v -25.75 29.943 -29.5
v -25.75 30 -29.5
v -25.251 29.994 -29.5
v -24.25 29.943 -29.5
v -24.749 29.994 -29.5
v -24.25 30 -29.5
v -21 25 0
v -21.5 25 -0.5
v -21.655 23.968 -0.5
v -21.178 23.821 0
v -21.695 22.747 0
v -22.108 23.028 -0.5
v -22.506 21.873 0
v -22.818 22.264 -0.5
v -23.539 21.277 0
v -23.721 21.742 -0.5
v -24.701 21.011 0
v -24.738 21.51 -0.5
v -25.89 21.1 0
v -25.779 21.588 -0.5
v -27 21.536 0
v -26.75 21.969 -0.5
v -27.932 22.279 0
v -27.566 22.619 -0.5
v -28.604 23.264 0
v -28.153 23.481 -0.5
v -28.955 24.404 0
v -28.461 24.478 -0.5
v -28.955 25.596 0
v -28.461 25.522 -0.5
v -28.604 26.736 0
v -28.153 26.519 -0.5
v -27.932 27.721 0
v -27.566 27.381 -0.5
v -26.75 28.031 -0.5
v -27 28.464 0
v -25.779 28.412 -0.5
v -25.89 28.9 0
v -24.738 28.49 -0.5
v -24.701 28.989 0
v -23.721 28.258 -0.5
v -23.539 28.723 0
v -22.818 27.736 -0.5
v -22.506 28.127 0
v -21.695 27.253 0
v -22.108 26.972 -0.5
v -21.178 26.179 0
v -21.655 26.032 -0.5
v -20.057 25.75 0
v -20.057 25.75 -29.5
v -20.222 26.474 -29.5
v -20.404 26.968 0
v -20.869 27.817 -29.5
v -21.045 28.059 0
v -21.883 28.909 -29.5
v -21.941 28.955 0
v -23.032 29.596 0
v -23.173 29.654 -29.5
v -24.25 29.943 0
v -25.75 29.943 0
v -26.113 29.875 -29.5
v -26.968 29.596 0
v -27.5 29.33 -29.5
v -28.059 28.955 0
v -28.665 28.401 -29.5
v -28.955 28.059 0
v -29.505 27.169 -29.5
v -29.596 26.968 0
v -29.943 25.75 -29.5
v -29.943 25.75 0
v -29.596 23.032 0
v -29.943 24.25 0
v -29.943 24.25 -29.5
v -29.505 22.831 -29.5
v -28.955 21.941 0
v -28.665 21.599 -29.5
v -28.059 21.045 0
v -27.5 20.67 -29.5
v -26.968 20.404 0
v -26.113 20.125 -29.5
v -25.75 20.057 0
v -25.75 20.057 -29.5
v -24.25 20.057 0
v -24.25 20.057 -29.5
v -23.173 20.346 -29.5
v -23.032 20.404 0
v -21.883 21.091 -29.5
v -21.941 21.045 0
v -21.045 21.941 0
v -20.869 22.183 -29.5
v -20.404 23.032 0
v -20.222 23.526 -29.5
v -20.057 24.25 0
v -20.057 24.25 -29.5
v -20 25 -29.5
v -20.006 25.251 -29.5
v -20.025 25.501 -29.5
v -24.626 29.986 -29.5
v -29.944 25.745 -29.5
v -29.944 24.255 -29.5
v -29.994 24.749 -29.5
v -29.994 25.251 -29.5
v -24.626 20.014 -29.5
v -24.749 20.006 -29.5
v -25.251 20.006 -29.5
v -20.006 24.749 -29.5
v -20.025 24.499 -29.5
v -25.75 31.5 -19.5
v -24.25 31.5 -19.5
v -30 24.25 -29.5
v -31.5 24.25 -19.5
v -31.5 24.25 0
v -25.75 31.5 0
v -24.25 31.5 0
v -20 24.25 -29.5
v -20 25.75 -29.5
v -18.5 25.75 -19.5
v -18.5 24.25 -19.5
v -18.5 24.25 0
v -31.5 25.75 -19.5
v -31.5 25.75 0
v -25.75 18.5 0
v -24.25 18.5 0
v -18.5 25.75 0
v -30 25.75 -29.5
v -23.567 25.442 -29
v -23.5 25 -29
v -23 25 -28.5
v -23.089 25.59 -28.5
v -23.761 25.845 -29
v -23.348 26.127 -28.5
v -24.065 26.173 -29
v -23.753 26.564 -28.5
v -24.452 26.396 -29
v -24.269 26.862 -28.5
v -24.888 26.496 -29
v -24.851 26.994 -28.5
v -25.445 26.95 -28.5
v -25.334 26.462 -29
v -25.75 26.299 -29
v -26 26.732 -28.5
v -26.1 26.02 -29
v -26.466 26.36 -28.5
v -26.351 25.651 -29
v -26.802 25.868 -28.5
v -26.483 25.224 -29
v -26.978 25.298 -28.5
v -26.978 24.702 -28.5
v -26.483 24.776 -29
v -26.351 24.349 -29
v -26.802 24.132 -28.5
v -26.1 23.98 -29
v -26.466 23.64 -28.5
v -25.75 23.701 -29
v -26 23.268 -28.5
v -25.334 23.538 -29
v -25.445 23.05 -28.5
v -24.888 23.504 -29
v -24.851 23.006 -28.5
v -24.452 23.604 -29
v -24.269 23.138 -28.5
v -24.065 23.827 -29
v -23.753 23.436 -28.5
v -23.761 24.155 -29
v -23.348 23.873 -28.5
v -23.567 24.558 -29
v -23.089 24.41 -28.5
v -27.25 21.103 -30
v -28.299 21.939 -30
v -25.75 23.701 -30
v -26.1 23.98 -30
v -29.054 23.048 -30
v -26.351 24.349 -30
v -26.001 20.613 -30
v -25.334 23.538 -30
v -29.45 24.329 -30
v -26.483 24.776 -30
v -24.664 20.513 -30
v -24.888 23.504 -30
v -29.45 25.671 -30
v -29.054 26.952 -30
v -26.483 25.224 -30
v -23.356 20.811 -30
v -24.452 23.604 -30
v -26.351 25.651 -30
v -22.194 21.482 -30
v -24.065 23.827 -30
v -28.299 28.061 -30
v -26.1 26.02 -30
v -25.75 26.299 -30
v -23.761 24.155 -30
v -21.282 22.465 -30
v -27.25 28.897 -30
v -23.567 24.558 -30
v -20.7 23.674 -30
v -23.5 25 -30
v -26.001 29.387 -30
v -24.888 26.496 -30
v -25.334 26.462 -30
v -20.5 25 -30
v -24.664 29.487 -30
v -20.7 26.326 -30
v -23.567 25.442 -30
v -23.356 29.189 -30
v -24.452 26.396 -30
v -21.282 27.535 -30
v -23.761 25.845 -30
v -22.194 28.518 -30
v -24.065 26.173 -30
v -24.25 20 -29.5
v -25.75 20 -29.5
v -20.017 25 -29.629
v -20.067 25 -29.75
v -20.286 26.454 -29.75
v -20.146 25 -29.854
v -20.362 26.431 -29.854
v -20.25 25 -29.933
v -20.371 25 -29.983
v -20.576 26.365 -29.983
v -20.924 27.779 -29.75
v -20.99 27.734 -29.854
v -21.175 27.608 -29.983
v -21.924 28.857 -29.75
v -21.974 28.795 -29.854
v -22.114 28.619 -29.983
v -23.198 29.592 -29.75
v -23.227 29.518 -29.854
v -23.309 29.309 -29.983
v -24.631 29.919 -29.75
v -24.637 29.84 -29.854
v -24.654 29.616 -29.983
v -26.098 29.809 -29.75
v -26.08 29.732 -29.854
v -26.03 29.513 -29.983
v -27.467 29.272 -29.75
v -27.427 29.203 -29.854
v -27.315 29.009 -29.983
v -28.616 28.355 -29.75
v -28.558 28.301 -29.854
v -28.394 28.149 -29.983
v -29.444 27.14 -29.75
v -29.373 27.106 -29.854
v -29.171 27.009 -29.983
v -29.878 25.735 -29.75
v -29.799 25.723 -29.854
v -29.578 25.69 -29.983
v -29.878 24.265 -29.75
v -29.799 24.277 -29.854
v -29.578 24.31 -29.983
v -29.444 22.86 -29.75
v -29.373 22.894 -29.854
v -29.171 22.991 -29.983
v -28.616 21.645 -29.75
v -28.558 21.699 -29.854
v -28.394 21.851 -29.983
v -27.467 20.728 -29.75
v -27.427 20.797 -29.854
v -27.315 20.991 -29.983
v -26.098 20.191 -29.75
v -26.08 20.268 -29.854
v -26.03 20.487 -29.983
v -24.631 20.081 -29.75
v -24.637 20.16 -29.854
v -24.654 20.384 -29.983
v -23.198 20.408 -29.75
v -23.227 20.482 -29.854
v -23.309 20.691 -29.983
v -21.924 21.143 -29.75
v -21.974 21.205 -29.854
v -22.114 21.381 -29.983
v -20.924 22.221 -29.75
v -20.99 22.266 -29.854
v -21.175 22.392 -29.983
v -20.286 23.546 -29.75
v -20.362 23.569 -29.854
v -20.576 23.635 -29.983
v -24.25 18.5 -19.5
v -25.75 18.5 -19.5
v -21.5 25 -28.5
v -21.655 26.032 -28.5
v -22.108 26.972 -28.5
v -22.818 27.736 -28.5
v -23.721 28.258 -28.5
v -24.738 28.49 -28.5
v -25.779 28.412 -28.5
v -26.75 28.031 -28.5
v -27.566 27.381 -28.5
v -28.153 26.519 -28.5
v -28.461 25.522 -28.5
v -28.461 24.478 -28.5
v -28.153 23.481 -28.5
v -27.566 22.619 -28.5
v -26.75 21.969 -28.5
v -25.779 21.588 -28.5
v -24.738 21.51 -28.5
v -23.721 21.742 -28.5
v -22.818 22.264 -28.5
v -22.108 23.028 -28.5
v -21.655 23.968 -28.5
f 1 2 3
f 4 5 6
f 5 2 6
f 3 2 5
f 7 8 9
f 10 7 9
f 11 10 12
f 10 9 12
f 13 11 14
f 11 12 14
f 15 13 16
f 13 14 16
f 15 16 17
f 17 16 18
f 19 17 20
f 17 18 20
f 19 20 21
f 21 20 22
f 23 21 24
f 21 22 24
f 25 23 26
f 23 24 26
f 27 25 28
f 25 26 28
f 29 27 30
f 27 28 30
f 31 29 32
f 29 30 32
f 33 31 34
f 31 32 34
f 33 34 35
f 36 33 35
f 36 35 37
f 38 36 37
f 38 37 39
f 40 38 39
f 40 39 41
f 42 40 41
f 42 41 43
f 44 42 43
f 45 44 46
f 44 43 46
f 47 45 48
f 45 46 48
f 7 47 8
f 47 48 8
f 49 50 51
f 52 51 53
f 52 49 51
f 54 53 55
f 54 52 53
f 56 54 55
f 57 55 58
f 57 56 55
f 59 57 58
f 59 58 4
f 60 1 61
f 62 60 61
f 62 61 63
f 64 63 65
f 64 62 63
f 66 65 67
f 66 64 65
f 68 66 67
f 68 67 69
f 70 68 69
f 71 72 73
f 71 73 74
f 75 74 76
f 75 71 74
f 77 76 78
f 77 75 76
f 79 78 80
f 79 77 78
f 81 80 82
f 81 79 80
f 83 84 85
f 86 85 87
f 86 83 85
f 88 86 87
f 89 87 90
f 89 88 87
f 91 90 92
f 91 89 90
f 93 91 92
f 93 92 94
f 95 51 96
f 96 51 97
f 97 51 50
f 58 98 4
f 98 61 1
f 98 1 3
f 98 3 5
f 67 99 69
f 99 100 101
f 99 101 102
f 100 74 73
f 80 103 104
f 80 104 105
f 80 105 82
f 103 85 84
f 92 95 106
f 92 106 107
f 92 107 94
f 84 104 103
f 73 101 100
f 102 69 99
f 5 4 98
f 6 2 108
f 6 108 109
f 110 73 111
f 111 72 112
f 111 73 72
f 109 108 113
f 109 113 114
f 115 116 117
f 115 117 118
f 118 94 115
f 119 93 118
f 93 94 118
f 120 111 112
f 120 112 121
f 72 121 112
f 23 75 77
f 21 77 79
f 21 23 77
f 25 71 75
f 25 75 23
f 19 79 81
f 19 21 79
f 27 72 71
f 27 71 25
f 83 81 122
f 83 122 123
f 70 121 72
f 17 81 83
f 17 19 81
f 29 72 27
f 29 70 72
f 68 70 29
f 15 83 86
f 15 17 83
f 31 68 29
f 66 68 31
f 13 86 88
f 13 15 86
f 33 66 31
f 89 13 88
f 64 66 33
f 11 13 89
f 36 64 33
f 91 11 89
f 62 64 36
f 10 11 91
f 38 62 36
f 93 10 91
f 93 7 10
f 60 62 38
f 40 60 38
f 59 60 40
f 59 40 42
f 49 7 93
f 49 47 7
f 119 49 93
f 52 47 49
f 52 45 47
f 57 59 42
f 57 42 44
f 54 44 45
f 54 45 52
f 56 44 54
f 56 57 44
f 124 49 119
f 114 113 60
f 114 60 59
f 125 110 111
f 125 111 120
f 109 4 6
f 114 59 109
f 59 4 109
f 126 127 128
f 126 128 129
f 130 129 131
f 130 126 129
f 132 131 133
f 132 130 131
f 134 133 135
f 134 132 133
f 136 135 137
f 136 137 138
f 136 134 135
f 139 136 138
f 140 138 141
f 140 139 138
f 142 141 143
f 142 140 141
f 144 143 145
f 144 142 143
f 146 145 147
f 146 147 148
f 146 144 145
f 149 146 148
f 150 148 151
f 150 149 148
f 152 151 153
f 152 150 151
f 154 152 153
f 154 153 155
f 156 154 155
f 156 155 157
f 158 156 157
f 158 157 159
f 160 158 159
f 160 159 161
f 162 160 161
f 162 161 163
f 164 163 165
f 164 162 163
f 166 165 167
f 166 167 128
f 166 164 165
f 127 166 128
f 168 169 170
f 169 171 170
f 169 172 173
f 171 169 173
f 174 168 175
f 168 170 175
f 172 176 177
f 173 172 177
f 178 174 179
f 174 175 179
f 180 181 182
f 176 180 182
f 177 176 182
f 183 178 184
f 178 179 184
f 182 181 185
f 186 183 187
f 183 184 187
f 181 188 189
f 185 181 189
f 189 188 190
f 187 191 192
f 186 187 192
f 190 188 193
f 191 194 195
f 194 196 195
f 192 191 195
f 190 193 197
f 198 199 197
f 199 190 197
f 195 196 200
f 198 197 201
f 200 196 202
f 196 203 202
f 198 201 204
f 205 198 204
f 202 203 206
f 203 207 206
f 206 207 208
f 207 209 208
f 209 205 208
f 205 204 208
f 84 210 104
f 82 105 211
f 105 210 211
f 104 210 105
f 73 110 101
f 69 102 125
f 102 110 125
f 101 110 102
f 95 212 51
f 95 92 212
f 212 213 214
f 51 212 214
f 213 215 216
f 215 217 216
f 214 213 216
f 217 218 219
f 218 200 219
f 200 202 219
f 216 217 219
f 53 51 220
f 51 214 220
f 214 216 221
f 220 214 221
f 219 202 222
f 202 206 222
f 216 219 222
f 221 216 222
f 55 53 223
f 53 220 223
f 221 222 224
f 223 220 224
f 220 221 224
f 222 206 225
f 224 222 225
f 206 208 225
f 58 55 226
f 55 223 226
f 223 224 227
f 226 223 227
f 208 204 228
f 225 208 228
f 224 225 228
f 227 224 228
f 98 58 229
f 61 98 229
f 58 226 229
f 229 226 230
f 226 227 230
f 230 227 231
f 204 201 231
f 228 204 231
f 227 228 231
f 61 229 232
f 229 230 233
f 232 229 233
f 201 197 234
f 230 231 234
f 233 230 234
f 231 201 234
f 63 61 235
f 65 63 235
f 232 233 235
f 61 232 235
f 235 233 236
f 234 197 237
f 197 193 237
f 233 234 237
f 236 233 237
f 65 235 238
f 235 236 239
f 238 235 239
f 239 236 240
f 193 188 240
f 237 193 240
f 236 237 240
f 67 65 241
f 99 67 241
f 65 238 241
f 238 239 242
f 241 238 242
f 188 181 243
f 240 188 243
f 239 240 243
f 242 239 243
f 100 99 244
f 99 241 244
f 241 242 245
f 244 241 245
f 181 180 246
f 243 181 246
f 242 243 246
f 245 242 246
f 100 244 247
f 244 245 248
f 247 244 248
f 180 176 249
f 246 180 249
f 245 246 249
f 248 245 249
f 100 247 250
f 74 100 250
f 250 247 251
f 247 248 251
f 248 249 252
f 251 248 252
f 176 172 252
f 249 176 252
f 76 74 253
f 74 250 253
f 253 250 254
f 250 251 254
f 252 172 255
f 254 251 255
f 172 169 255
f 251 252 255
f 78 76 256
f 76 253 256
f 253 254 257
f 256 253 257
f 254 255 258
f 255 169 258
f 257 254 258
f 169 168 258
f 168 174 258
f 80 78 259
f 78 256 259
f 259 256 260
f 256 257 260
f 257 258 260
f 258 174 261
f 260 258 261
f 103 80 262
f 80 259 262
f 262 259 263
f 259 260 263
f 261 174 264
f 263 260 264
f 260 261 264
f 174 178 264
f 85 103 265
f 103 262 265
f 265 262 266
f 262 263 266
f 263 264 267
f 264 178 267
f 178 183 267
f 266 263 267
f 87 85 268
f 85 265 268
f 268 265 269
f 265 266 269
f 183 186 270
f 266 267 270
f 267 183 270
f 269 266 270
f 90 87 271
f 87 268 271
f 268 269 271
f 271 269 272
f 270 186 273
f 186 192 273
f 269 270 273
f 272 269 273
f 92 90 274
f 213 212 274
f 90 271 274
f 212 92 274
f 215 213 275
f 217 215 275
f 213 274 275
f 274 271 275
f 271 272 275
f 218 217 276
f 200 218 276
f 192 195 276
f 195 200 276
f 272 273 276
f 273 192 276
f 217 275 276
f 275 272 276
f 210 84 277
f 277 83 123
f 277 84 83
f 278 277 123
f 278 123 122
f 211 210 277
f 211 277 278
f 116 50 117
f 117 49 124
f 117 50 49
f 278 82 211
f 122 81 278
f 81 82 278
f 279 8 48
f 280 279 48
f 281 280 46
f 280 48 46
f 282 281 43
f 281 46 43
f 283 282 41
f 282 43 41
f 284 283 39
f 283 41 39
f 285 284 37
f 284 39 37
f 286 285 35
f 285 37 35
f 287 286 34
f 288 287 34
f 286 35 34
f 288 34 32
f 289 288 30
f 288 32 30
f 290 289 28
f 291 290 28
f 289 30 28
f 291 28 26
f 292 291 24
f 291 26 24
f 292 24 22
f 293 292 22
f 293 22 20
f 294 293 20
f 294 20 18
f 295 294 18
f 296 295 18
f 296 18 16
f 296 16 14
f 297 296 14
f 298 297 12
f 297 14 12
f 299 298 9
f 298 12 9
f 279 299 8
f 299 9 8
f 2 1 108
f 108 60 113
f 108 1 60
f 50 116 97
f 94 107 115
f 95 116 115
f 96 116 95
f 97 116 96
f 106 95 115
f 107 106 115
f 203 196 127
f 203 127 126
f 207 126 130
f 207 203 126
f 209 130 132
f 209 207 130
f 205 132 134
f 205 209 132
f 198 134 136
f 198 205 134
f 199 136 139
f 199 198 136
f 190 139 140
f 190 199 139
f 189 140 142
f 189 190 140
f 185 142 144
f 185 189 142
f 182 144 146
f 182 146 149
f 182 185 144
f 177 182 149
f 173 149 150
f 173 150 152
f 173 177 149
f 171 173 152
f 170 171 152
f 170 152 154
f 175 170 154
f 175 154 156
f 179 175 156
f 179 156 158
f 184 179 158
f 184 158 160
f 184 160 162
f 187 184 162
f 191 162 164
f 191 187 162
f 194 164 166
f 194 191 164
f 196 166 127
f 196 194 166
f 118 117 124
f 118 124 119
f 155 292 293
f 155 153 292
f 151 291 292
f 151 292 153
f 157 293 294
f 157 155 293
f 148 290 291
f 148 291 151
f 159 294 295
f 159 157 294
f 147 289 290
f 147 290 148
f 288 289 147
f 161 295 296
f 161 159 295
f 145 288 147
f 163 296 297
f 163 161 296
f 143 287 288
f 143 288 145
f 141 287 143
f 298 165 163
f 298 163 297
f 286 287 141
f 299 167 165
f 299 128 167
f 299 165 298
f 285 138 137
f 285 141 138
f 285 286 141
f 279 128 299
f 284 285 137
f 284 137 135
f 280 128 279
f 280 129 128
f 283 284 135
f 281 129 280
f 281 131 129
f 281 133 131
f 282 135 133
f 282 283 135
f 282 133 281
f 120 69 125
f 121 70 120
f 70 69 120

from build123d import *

# Parameters (mm, degrees)
F1_R        = 5
F1_R_2      = 3.5
F2_DEPTH    = 30
F4_W        = 1.5
F4_H        = 2.639524132
F5_DEPTH    = 29.5
F6_COUNT    = 4
F8_R        = 3.5
F8_R_2      = 1.5
F9_DEPTH    = 1.5
F10_SIZE2   = 1.49999
F10_SIZE    = 9.99999
F10_2_SIZE2 = 1.49999
F10_2_SIZE  = 9.99999
F10_3_SIZE2 = 1.49999
F10_3_SIZE  = 9.99999
F10_4_SIZE2 = 1.49999
F10_4_SIZE  = 9.99999
F11_SIZE    = 0.5
F12_R       = 0.49999


# Not quite as in the source:
# - a fillet or chamfer is up to 0.001 mm smaller than in the source, because OpenCascade refuses the exact size


with BuildPart() as f2:
    # F1 (on offset) → F2 (new body)
    with BuildSketch(Plane.XY):
        with Locations((-25, 25)):
            Circle(F1_R)
        with Locations((-25, 25)):
            Circle(F1_R_2, mode=Mode.SUBTRACT)
    extrude(amount=-F2_DEPTH)

    # F4 (on offset) → F5 (join)
    with BuildSketch(Plane.XY):
        with Locations((-25, 30.180237934)):
            Rectangle(F4_W, F4_H)
    extrude(amount=-F5_DEPTH)

    # F6: F2 ×4 about axis
    f6_axis = Axis((-25, 25, 0), (0, 0, 1))


with BuildPart() as f2_1:
    add(f2.part)
    for i in range(1, F6_COUNT):
        add(f2.part.rotate(f6_axis, i * 360 / F6_COUNT))

    # F8 (on offset) → F9 (join)
    with BuildSketch(Plane.XY.offset(-30)):
        with Locations((-25, 25)):
            Circle(F8_R)
        with Locations((-25, 25)):
            Circle(F8_R_2, mode=Mode.SUBTRACT)
    extrude(amount=F9_DEPTH)

    # F10 (size 10 and 1.5 in the source; OpenCascade refuses exactly that, so slightly less here)
    f10_edges = [f2_1.edges().sort_by_distance(p)[0] for p in [
        (-25, 18.5, -29.5),
    ]]
    f10_side = f2_1.faces().sort_by_distance((-25, 18.5, -14.75))[0]
    chamfer(f10_edges, length=F10_SIZE, length2=F10_SIZE2, reference=f10_side)

    # F10#2 (size 10 and 1.5 in the source; OpenCascade refuses exactly that, so slightly less here)
    f10_2_edges = [f2_1.edges().sort_by_distance(p)[0] for p in [
        (-18.5, 25, -29.5),
    ]]
    f10_2_side = f2_1.faces().sort_by_distance((-18.5, 25, -14.75))[0]
    chamfer(f10_2_edges, length=F10_2_SIZE, length2=F10_2_SIZE2, reference=f10_2_side)

    # F10#3 (size 10 and 1.5 in the source; OpenCascade refuses exactly that, so slightly less here)
    f10_3_edges = [f2_1.edges().sort_by_distance(p)[0] for p in [
        (-25, 31.5, -29.5),
    ]]
    f10_3_side = f2_1.faces().sort_by_distance((-25, 31.5, -14.75))[0]
    chamfer(f10_3_edges, length=F10_3_SIZE, length2=F10_3_SIZE2, reference=f10_3_side)

    # F10#4 (size 10 and 1.5 in the source; OpenCascade refuses exactly that, so slightly less here)
    f10_4_edges = [f2_1.edges().sort_by_distance(p)[0] for p in [
        (-31.5, 25, -29.5),
    ]]
    f10_4_side = f2_1.faces().sort_by_distance((-31.5, 25, -14.75))[0]
    chamfer(f10_4_edges, length=F10_4_SIZE, length2=F10_4_SIZE2, reference=f10_4_side)

    # F11
    f11_edges = [f2_1.edges().sort_by_distance(p)[0] for p in [
        (-28.5, 25, 0),
        (-26.5, 25, -28.5),
    ]]
    chamfer(f11_edges, length=F11_SIZE)

    # F12 (radius 0.5 in the source; OpenCascade refuses exactly that, so slightly less here)
    f12_edges = [f2_1.edges().sort_by_distance(p)[0] for p in [
        (-30, 25, -30),
    ]]
    fillet(f12_edges, radius=F12_R)


solid = f2_1.part
